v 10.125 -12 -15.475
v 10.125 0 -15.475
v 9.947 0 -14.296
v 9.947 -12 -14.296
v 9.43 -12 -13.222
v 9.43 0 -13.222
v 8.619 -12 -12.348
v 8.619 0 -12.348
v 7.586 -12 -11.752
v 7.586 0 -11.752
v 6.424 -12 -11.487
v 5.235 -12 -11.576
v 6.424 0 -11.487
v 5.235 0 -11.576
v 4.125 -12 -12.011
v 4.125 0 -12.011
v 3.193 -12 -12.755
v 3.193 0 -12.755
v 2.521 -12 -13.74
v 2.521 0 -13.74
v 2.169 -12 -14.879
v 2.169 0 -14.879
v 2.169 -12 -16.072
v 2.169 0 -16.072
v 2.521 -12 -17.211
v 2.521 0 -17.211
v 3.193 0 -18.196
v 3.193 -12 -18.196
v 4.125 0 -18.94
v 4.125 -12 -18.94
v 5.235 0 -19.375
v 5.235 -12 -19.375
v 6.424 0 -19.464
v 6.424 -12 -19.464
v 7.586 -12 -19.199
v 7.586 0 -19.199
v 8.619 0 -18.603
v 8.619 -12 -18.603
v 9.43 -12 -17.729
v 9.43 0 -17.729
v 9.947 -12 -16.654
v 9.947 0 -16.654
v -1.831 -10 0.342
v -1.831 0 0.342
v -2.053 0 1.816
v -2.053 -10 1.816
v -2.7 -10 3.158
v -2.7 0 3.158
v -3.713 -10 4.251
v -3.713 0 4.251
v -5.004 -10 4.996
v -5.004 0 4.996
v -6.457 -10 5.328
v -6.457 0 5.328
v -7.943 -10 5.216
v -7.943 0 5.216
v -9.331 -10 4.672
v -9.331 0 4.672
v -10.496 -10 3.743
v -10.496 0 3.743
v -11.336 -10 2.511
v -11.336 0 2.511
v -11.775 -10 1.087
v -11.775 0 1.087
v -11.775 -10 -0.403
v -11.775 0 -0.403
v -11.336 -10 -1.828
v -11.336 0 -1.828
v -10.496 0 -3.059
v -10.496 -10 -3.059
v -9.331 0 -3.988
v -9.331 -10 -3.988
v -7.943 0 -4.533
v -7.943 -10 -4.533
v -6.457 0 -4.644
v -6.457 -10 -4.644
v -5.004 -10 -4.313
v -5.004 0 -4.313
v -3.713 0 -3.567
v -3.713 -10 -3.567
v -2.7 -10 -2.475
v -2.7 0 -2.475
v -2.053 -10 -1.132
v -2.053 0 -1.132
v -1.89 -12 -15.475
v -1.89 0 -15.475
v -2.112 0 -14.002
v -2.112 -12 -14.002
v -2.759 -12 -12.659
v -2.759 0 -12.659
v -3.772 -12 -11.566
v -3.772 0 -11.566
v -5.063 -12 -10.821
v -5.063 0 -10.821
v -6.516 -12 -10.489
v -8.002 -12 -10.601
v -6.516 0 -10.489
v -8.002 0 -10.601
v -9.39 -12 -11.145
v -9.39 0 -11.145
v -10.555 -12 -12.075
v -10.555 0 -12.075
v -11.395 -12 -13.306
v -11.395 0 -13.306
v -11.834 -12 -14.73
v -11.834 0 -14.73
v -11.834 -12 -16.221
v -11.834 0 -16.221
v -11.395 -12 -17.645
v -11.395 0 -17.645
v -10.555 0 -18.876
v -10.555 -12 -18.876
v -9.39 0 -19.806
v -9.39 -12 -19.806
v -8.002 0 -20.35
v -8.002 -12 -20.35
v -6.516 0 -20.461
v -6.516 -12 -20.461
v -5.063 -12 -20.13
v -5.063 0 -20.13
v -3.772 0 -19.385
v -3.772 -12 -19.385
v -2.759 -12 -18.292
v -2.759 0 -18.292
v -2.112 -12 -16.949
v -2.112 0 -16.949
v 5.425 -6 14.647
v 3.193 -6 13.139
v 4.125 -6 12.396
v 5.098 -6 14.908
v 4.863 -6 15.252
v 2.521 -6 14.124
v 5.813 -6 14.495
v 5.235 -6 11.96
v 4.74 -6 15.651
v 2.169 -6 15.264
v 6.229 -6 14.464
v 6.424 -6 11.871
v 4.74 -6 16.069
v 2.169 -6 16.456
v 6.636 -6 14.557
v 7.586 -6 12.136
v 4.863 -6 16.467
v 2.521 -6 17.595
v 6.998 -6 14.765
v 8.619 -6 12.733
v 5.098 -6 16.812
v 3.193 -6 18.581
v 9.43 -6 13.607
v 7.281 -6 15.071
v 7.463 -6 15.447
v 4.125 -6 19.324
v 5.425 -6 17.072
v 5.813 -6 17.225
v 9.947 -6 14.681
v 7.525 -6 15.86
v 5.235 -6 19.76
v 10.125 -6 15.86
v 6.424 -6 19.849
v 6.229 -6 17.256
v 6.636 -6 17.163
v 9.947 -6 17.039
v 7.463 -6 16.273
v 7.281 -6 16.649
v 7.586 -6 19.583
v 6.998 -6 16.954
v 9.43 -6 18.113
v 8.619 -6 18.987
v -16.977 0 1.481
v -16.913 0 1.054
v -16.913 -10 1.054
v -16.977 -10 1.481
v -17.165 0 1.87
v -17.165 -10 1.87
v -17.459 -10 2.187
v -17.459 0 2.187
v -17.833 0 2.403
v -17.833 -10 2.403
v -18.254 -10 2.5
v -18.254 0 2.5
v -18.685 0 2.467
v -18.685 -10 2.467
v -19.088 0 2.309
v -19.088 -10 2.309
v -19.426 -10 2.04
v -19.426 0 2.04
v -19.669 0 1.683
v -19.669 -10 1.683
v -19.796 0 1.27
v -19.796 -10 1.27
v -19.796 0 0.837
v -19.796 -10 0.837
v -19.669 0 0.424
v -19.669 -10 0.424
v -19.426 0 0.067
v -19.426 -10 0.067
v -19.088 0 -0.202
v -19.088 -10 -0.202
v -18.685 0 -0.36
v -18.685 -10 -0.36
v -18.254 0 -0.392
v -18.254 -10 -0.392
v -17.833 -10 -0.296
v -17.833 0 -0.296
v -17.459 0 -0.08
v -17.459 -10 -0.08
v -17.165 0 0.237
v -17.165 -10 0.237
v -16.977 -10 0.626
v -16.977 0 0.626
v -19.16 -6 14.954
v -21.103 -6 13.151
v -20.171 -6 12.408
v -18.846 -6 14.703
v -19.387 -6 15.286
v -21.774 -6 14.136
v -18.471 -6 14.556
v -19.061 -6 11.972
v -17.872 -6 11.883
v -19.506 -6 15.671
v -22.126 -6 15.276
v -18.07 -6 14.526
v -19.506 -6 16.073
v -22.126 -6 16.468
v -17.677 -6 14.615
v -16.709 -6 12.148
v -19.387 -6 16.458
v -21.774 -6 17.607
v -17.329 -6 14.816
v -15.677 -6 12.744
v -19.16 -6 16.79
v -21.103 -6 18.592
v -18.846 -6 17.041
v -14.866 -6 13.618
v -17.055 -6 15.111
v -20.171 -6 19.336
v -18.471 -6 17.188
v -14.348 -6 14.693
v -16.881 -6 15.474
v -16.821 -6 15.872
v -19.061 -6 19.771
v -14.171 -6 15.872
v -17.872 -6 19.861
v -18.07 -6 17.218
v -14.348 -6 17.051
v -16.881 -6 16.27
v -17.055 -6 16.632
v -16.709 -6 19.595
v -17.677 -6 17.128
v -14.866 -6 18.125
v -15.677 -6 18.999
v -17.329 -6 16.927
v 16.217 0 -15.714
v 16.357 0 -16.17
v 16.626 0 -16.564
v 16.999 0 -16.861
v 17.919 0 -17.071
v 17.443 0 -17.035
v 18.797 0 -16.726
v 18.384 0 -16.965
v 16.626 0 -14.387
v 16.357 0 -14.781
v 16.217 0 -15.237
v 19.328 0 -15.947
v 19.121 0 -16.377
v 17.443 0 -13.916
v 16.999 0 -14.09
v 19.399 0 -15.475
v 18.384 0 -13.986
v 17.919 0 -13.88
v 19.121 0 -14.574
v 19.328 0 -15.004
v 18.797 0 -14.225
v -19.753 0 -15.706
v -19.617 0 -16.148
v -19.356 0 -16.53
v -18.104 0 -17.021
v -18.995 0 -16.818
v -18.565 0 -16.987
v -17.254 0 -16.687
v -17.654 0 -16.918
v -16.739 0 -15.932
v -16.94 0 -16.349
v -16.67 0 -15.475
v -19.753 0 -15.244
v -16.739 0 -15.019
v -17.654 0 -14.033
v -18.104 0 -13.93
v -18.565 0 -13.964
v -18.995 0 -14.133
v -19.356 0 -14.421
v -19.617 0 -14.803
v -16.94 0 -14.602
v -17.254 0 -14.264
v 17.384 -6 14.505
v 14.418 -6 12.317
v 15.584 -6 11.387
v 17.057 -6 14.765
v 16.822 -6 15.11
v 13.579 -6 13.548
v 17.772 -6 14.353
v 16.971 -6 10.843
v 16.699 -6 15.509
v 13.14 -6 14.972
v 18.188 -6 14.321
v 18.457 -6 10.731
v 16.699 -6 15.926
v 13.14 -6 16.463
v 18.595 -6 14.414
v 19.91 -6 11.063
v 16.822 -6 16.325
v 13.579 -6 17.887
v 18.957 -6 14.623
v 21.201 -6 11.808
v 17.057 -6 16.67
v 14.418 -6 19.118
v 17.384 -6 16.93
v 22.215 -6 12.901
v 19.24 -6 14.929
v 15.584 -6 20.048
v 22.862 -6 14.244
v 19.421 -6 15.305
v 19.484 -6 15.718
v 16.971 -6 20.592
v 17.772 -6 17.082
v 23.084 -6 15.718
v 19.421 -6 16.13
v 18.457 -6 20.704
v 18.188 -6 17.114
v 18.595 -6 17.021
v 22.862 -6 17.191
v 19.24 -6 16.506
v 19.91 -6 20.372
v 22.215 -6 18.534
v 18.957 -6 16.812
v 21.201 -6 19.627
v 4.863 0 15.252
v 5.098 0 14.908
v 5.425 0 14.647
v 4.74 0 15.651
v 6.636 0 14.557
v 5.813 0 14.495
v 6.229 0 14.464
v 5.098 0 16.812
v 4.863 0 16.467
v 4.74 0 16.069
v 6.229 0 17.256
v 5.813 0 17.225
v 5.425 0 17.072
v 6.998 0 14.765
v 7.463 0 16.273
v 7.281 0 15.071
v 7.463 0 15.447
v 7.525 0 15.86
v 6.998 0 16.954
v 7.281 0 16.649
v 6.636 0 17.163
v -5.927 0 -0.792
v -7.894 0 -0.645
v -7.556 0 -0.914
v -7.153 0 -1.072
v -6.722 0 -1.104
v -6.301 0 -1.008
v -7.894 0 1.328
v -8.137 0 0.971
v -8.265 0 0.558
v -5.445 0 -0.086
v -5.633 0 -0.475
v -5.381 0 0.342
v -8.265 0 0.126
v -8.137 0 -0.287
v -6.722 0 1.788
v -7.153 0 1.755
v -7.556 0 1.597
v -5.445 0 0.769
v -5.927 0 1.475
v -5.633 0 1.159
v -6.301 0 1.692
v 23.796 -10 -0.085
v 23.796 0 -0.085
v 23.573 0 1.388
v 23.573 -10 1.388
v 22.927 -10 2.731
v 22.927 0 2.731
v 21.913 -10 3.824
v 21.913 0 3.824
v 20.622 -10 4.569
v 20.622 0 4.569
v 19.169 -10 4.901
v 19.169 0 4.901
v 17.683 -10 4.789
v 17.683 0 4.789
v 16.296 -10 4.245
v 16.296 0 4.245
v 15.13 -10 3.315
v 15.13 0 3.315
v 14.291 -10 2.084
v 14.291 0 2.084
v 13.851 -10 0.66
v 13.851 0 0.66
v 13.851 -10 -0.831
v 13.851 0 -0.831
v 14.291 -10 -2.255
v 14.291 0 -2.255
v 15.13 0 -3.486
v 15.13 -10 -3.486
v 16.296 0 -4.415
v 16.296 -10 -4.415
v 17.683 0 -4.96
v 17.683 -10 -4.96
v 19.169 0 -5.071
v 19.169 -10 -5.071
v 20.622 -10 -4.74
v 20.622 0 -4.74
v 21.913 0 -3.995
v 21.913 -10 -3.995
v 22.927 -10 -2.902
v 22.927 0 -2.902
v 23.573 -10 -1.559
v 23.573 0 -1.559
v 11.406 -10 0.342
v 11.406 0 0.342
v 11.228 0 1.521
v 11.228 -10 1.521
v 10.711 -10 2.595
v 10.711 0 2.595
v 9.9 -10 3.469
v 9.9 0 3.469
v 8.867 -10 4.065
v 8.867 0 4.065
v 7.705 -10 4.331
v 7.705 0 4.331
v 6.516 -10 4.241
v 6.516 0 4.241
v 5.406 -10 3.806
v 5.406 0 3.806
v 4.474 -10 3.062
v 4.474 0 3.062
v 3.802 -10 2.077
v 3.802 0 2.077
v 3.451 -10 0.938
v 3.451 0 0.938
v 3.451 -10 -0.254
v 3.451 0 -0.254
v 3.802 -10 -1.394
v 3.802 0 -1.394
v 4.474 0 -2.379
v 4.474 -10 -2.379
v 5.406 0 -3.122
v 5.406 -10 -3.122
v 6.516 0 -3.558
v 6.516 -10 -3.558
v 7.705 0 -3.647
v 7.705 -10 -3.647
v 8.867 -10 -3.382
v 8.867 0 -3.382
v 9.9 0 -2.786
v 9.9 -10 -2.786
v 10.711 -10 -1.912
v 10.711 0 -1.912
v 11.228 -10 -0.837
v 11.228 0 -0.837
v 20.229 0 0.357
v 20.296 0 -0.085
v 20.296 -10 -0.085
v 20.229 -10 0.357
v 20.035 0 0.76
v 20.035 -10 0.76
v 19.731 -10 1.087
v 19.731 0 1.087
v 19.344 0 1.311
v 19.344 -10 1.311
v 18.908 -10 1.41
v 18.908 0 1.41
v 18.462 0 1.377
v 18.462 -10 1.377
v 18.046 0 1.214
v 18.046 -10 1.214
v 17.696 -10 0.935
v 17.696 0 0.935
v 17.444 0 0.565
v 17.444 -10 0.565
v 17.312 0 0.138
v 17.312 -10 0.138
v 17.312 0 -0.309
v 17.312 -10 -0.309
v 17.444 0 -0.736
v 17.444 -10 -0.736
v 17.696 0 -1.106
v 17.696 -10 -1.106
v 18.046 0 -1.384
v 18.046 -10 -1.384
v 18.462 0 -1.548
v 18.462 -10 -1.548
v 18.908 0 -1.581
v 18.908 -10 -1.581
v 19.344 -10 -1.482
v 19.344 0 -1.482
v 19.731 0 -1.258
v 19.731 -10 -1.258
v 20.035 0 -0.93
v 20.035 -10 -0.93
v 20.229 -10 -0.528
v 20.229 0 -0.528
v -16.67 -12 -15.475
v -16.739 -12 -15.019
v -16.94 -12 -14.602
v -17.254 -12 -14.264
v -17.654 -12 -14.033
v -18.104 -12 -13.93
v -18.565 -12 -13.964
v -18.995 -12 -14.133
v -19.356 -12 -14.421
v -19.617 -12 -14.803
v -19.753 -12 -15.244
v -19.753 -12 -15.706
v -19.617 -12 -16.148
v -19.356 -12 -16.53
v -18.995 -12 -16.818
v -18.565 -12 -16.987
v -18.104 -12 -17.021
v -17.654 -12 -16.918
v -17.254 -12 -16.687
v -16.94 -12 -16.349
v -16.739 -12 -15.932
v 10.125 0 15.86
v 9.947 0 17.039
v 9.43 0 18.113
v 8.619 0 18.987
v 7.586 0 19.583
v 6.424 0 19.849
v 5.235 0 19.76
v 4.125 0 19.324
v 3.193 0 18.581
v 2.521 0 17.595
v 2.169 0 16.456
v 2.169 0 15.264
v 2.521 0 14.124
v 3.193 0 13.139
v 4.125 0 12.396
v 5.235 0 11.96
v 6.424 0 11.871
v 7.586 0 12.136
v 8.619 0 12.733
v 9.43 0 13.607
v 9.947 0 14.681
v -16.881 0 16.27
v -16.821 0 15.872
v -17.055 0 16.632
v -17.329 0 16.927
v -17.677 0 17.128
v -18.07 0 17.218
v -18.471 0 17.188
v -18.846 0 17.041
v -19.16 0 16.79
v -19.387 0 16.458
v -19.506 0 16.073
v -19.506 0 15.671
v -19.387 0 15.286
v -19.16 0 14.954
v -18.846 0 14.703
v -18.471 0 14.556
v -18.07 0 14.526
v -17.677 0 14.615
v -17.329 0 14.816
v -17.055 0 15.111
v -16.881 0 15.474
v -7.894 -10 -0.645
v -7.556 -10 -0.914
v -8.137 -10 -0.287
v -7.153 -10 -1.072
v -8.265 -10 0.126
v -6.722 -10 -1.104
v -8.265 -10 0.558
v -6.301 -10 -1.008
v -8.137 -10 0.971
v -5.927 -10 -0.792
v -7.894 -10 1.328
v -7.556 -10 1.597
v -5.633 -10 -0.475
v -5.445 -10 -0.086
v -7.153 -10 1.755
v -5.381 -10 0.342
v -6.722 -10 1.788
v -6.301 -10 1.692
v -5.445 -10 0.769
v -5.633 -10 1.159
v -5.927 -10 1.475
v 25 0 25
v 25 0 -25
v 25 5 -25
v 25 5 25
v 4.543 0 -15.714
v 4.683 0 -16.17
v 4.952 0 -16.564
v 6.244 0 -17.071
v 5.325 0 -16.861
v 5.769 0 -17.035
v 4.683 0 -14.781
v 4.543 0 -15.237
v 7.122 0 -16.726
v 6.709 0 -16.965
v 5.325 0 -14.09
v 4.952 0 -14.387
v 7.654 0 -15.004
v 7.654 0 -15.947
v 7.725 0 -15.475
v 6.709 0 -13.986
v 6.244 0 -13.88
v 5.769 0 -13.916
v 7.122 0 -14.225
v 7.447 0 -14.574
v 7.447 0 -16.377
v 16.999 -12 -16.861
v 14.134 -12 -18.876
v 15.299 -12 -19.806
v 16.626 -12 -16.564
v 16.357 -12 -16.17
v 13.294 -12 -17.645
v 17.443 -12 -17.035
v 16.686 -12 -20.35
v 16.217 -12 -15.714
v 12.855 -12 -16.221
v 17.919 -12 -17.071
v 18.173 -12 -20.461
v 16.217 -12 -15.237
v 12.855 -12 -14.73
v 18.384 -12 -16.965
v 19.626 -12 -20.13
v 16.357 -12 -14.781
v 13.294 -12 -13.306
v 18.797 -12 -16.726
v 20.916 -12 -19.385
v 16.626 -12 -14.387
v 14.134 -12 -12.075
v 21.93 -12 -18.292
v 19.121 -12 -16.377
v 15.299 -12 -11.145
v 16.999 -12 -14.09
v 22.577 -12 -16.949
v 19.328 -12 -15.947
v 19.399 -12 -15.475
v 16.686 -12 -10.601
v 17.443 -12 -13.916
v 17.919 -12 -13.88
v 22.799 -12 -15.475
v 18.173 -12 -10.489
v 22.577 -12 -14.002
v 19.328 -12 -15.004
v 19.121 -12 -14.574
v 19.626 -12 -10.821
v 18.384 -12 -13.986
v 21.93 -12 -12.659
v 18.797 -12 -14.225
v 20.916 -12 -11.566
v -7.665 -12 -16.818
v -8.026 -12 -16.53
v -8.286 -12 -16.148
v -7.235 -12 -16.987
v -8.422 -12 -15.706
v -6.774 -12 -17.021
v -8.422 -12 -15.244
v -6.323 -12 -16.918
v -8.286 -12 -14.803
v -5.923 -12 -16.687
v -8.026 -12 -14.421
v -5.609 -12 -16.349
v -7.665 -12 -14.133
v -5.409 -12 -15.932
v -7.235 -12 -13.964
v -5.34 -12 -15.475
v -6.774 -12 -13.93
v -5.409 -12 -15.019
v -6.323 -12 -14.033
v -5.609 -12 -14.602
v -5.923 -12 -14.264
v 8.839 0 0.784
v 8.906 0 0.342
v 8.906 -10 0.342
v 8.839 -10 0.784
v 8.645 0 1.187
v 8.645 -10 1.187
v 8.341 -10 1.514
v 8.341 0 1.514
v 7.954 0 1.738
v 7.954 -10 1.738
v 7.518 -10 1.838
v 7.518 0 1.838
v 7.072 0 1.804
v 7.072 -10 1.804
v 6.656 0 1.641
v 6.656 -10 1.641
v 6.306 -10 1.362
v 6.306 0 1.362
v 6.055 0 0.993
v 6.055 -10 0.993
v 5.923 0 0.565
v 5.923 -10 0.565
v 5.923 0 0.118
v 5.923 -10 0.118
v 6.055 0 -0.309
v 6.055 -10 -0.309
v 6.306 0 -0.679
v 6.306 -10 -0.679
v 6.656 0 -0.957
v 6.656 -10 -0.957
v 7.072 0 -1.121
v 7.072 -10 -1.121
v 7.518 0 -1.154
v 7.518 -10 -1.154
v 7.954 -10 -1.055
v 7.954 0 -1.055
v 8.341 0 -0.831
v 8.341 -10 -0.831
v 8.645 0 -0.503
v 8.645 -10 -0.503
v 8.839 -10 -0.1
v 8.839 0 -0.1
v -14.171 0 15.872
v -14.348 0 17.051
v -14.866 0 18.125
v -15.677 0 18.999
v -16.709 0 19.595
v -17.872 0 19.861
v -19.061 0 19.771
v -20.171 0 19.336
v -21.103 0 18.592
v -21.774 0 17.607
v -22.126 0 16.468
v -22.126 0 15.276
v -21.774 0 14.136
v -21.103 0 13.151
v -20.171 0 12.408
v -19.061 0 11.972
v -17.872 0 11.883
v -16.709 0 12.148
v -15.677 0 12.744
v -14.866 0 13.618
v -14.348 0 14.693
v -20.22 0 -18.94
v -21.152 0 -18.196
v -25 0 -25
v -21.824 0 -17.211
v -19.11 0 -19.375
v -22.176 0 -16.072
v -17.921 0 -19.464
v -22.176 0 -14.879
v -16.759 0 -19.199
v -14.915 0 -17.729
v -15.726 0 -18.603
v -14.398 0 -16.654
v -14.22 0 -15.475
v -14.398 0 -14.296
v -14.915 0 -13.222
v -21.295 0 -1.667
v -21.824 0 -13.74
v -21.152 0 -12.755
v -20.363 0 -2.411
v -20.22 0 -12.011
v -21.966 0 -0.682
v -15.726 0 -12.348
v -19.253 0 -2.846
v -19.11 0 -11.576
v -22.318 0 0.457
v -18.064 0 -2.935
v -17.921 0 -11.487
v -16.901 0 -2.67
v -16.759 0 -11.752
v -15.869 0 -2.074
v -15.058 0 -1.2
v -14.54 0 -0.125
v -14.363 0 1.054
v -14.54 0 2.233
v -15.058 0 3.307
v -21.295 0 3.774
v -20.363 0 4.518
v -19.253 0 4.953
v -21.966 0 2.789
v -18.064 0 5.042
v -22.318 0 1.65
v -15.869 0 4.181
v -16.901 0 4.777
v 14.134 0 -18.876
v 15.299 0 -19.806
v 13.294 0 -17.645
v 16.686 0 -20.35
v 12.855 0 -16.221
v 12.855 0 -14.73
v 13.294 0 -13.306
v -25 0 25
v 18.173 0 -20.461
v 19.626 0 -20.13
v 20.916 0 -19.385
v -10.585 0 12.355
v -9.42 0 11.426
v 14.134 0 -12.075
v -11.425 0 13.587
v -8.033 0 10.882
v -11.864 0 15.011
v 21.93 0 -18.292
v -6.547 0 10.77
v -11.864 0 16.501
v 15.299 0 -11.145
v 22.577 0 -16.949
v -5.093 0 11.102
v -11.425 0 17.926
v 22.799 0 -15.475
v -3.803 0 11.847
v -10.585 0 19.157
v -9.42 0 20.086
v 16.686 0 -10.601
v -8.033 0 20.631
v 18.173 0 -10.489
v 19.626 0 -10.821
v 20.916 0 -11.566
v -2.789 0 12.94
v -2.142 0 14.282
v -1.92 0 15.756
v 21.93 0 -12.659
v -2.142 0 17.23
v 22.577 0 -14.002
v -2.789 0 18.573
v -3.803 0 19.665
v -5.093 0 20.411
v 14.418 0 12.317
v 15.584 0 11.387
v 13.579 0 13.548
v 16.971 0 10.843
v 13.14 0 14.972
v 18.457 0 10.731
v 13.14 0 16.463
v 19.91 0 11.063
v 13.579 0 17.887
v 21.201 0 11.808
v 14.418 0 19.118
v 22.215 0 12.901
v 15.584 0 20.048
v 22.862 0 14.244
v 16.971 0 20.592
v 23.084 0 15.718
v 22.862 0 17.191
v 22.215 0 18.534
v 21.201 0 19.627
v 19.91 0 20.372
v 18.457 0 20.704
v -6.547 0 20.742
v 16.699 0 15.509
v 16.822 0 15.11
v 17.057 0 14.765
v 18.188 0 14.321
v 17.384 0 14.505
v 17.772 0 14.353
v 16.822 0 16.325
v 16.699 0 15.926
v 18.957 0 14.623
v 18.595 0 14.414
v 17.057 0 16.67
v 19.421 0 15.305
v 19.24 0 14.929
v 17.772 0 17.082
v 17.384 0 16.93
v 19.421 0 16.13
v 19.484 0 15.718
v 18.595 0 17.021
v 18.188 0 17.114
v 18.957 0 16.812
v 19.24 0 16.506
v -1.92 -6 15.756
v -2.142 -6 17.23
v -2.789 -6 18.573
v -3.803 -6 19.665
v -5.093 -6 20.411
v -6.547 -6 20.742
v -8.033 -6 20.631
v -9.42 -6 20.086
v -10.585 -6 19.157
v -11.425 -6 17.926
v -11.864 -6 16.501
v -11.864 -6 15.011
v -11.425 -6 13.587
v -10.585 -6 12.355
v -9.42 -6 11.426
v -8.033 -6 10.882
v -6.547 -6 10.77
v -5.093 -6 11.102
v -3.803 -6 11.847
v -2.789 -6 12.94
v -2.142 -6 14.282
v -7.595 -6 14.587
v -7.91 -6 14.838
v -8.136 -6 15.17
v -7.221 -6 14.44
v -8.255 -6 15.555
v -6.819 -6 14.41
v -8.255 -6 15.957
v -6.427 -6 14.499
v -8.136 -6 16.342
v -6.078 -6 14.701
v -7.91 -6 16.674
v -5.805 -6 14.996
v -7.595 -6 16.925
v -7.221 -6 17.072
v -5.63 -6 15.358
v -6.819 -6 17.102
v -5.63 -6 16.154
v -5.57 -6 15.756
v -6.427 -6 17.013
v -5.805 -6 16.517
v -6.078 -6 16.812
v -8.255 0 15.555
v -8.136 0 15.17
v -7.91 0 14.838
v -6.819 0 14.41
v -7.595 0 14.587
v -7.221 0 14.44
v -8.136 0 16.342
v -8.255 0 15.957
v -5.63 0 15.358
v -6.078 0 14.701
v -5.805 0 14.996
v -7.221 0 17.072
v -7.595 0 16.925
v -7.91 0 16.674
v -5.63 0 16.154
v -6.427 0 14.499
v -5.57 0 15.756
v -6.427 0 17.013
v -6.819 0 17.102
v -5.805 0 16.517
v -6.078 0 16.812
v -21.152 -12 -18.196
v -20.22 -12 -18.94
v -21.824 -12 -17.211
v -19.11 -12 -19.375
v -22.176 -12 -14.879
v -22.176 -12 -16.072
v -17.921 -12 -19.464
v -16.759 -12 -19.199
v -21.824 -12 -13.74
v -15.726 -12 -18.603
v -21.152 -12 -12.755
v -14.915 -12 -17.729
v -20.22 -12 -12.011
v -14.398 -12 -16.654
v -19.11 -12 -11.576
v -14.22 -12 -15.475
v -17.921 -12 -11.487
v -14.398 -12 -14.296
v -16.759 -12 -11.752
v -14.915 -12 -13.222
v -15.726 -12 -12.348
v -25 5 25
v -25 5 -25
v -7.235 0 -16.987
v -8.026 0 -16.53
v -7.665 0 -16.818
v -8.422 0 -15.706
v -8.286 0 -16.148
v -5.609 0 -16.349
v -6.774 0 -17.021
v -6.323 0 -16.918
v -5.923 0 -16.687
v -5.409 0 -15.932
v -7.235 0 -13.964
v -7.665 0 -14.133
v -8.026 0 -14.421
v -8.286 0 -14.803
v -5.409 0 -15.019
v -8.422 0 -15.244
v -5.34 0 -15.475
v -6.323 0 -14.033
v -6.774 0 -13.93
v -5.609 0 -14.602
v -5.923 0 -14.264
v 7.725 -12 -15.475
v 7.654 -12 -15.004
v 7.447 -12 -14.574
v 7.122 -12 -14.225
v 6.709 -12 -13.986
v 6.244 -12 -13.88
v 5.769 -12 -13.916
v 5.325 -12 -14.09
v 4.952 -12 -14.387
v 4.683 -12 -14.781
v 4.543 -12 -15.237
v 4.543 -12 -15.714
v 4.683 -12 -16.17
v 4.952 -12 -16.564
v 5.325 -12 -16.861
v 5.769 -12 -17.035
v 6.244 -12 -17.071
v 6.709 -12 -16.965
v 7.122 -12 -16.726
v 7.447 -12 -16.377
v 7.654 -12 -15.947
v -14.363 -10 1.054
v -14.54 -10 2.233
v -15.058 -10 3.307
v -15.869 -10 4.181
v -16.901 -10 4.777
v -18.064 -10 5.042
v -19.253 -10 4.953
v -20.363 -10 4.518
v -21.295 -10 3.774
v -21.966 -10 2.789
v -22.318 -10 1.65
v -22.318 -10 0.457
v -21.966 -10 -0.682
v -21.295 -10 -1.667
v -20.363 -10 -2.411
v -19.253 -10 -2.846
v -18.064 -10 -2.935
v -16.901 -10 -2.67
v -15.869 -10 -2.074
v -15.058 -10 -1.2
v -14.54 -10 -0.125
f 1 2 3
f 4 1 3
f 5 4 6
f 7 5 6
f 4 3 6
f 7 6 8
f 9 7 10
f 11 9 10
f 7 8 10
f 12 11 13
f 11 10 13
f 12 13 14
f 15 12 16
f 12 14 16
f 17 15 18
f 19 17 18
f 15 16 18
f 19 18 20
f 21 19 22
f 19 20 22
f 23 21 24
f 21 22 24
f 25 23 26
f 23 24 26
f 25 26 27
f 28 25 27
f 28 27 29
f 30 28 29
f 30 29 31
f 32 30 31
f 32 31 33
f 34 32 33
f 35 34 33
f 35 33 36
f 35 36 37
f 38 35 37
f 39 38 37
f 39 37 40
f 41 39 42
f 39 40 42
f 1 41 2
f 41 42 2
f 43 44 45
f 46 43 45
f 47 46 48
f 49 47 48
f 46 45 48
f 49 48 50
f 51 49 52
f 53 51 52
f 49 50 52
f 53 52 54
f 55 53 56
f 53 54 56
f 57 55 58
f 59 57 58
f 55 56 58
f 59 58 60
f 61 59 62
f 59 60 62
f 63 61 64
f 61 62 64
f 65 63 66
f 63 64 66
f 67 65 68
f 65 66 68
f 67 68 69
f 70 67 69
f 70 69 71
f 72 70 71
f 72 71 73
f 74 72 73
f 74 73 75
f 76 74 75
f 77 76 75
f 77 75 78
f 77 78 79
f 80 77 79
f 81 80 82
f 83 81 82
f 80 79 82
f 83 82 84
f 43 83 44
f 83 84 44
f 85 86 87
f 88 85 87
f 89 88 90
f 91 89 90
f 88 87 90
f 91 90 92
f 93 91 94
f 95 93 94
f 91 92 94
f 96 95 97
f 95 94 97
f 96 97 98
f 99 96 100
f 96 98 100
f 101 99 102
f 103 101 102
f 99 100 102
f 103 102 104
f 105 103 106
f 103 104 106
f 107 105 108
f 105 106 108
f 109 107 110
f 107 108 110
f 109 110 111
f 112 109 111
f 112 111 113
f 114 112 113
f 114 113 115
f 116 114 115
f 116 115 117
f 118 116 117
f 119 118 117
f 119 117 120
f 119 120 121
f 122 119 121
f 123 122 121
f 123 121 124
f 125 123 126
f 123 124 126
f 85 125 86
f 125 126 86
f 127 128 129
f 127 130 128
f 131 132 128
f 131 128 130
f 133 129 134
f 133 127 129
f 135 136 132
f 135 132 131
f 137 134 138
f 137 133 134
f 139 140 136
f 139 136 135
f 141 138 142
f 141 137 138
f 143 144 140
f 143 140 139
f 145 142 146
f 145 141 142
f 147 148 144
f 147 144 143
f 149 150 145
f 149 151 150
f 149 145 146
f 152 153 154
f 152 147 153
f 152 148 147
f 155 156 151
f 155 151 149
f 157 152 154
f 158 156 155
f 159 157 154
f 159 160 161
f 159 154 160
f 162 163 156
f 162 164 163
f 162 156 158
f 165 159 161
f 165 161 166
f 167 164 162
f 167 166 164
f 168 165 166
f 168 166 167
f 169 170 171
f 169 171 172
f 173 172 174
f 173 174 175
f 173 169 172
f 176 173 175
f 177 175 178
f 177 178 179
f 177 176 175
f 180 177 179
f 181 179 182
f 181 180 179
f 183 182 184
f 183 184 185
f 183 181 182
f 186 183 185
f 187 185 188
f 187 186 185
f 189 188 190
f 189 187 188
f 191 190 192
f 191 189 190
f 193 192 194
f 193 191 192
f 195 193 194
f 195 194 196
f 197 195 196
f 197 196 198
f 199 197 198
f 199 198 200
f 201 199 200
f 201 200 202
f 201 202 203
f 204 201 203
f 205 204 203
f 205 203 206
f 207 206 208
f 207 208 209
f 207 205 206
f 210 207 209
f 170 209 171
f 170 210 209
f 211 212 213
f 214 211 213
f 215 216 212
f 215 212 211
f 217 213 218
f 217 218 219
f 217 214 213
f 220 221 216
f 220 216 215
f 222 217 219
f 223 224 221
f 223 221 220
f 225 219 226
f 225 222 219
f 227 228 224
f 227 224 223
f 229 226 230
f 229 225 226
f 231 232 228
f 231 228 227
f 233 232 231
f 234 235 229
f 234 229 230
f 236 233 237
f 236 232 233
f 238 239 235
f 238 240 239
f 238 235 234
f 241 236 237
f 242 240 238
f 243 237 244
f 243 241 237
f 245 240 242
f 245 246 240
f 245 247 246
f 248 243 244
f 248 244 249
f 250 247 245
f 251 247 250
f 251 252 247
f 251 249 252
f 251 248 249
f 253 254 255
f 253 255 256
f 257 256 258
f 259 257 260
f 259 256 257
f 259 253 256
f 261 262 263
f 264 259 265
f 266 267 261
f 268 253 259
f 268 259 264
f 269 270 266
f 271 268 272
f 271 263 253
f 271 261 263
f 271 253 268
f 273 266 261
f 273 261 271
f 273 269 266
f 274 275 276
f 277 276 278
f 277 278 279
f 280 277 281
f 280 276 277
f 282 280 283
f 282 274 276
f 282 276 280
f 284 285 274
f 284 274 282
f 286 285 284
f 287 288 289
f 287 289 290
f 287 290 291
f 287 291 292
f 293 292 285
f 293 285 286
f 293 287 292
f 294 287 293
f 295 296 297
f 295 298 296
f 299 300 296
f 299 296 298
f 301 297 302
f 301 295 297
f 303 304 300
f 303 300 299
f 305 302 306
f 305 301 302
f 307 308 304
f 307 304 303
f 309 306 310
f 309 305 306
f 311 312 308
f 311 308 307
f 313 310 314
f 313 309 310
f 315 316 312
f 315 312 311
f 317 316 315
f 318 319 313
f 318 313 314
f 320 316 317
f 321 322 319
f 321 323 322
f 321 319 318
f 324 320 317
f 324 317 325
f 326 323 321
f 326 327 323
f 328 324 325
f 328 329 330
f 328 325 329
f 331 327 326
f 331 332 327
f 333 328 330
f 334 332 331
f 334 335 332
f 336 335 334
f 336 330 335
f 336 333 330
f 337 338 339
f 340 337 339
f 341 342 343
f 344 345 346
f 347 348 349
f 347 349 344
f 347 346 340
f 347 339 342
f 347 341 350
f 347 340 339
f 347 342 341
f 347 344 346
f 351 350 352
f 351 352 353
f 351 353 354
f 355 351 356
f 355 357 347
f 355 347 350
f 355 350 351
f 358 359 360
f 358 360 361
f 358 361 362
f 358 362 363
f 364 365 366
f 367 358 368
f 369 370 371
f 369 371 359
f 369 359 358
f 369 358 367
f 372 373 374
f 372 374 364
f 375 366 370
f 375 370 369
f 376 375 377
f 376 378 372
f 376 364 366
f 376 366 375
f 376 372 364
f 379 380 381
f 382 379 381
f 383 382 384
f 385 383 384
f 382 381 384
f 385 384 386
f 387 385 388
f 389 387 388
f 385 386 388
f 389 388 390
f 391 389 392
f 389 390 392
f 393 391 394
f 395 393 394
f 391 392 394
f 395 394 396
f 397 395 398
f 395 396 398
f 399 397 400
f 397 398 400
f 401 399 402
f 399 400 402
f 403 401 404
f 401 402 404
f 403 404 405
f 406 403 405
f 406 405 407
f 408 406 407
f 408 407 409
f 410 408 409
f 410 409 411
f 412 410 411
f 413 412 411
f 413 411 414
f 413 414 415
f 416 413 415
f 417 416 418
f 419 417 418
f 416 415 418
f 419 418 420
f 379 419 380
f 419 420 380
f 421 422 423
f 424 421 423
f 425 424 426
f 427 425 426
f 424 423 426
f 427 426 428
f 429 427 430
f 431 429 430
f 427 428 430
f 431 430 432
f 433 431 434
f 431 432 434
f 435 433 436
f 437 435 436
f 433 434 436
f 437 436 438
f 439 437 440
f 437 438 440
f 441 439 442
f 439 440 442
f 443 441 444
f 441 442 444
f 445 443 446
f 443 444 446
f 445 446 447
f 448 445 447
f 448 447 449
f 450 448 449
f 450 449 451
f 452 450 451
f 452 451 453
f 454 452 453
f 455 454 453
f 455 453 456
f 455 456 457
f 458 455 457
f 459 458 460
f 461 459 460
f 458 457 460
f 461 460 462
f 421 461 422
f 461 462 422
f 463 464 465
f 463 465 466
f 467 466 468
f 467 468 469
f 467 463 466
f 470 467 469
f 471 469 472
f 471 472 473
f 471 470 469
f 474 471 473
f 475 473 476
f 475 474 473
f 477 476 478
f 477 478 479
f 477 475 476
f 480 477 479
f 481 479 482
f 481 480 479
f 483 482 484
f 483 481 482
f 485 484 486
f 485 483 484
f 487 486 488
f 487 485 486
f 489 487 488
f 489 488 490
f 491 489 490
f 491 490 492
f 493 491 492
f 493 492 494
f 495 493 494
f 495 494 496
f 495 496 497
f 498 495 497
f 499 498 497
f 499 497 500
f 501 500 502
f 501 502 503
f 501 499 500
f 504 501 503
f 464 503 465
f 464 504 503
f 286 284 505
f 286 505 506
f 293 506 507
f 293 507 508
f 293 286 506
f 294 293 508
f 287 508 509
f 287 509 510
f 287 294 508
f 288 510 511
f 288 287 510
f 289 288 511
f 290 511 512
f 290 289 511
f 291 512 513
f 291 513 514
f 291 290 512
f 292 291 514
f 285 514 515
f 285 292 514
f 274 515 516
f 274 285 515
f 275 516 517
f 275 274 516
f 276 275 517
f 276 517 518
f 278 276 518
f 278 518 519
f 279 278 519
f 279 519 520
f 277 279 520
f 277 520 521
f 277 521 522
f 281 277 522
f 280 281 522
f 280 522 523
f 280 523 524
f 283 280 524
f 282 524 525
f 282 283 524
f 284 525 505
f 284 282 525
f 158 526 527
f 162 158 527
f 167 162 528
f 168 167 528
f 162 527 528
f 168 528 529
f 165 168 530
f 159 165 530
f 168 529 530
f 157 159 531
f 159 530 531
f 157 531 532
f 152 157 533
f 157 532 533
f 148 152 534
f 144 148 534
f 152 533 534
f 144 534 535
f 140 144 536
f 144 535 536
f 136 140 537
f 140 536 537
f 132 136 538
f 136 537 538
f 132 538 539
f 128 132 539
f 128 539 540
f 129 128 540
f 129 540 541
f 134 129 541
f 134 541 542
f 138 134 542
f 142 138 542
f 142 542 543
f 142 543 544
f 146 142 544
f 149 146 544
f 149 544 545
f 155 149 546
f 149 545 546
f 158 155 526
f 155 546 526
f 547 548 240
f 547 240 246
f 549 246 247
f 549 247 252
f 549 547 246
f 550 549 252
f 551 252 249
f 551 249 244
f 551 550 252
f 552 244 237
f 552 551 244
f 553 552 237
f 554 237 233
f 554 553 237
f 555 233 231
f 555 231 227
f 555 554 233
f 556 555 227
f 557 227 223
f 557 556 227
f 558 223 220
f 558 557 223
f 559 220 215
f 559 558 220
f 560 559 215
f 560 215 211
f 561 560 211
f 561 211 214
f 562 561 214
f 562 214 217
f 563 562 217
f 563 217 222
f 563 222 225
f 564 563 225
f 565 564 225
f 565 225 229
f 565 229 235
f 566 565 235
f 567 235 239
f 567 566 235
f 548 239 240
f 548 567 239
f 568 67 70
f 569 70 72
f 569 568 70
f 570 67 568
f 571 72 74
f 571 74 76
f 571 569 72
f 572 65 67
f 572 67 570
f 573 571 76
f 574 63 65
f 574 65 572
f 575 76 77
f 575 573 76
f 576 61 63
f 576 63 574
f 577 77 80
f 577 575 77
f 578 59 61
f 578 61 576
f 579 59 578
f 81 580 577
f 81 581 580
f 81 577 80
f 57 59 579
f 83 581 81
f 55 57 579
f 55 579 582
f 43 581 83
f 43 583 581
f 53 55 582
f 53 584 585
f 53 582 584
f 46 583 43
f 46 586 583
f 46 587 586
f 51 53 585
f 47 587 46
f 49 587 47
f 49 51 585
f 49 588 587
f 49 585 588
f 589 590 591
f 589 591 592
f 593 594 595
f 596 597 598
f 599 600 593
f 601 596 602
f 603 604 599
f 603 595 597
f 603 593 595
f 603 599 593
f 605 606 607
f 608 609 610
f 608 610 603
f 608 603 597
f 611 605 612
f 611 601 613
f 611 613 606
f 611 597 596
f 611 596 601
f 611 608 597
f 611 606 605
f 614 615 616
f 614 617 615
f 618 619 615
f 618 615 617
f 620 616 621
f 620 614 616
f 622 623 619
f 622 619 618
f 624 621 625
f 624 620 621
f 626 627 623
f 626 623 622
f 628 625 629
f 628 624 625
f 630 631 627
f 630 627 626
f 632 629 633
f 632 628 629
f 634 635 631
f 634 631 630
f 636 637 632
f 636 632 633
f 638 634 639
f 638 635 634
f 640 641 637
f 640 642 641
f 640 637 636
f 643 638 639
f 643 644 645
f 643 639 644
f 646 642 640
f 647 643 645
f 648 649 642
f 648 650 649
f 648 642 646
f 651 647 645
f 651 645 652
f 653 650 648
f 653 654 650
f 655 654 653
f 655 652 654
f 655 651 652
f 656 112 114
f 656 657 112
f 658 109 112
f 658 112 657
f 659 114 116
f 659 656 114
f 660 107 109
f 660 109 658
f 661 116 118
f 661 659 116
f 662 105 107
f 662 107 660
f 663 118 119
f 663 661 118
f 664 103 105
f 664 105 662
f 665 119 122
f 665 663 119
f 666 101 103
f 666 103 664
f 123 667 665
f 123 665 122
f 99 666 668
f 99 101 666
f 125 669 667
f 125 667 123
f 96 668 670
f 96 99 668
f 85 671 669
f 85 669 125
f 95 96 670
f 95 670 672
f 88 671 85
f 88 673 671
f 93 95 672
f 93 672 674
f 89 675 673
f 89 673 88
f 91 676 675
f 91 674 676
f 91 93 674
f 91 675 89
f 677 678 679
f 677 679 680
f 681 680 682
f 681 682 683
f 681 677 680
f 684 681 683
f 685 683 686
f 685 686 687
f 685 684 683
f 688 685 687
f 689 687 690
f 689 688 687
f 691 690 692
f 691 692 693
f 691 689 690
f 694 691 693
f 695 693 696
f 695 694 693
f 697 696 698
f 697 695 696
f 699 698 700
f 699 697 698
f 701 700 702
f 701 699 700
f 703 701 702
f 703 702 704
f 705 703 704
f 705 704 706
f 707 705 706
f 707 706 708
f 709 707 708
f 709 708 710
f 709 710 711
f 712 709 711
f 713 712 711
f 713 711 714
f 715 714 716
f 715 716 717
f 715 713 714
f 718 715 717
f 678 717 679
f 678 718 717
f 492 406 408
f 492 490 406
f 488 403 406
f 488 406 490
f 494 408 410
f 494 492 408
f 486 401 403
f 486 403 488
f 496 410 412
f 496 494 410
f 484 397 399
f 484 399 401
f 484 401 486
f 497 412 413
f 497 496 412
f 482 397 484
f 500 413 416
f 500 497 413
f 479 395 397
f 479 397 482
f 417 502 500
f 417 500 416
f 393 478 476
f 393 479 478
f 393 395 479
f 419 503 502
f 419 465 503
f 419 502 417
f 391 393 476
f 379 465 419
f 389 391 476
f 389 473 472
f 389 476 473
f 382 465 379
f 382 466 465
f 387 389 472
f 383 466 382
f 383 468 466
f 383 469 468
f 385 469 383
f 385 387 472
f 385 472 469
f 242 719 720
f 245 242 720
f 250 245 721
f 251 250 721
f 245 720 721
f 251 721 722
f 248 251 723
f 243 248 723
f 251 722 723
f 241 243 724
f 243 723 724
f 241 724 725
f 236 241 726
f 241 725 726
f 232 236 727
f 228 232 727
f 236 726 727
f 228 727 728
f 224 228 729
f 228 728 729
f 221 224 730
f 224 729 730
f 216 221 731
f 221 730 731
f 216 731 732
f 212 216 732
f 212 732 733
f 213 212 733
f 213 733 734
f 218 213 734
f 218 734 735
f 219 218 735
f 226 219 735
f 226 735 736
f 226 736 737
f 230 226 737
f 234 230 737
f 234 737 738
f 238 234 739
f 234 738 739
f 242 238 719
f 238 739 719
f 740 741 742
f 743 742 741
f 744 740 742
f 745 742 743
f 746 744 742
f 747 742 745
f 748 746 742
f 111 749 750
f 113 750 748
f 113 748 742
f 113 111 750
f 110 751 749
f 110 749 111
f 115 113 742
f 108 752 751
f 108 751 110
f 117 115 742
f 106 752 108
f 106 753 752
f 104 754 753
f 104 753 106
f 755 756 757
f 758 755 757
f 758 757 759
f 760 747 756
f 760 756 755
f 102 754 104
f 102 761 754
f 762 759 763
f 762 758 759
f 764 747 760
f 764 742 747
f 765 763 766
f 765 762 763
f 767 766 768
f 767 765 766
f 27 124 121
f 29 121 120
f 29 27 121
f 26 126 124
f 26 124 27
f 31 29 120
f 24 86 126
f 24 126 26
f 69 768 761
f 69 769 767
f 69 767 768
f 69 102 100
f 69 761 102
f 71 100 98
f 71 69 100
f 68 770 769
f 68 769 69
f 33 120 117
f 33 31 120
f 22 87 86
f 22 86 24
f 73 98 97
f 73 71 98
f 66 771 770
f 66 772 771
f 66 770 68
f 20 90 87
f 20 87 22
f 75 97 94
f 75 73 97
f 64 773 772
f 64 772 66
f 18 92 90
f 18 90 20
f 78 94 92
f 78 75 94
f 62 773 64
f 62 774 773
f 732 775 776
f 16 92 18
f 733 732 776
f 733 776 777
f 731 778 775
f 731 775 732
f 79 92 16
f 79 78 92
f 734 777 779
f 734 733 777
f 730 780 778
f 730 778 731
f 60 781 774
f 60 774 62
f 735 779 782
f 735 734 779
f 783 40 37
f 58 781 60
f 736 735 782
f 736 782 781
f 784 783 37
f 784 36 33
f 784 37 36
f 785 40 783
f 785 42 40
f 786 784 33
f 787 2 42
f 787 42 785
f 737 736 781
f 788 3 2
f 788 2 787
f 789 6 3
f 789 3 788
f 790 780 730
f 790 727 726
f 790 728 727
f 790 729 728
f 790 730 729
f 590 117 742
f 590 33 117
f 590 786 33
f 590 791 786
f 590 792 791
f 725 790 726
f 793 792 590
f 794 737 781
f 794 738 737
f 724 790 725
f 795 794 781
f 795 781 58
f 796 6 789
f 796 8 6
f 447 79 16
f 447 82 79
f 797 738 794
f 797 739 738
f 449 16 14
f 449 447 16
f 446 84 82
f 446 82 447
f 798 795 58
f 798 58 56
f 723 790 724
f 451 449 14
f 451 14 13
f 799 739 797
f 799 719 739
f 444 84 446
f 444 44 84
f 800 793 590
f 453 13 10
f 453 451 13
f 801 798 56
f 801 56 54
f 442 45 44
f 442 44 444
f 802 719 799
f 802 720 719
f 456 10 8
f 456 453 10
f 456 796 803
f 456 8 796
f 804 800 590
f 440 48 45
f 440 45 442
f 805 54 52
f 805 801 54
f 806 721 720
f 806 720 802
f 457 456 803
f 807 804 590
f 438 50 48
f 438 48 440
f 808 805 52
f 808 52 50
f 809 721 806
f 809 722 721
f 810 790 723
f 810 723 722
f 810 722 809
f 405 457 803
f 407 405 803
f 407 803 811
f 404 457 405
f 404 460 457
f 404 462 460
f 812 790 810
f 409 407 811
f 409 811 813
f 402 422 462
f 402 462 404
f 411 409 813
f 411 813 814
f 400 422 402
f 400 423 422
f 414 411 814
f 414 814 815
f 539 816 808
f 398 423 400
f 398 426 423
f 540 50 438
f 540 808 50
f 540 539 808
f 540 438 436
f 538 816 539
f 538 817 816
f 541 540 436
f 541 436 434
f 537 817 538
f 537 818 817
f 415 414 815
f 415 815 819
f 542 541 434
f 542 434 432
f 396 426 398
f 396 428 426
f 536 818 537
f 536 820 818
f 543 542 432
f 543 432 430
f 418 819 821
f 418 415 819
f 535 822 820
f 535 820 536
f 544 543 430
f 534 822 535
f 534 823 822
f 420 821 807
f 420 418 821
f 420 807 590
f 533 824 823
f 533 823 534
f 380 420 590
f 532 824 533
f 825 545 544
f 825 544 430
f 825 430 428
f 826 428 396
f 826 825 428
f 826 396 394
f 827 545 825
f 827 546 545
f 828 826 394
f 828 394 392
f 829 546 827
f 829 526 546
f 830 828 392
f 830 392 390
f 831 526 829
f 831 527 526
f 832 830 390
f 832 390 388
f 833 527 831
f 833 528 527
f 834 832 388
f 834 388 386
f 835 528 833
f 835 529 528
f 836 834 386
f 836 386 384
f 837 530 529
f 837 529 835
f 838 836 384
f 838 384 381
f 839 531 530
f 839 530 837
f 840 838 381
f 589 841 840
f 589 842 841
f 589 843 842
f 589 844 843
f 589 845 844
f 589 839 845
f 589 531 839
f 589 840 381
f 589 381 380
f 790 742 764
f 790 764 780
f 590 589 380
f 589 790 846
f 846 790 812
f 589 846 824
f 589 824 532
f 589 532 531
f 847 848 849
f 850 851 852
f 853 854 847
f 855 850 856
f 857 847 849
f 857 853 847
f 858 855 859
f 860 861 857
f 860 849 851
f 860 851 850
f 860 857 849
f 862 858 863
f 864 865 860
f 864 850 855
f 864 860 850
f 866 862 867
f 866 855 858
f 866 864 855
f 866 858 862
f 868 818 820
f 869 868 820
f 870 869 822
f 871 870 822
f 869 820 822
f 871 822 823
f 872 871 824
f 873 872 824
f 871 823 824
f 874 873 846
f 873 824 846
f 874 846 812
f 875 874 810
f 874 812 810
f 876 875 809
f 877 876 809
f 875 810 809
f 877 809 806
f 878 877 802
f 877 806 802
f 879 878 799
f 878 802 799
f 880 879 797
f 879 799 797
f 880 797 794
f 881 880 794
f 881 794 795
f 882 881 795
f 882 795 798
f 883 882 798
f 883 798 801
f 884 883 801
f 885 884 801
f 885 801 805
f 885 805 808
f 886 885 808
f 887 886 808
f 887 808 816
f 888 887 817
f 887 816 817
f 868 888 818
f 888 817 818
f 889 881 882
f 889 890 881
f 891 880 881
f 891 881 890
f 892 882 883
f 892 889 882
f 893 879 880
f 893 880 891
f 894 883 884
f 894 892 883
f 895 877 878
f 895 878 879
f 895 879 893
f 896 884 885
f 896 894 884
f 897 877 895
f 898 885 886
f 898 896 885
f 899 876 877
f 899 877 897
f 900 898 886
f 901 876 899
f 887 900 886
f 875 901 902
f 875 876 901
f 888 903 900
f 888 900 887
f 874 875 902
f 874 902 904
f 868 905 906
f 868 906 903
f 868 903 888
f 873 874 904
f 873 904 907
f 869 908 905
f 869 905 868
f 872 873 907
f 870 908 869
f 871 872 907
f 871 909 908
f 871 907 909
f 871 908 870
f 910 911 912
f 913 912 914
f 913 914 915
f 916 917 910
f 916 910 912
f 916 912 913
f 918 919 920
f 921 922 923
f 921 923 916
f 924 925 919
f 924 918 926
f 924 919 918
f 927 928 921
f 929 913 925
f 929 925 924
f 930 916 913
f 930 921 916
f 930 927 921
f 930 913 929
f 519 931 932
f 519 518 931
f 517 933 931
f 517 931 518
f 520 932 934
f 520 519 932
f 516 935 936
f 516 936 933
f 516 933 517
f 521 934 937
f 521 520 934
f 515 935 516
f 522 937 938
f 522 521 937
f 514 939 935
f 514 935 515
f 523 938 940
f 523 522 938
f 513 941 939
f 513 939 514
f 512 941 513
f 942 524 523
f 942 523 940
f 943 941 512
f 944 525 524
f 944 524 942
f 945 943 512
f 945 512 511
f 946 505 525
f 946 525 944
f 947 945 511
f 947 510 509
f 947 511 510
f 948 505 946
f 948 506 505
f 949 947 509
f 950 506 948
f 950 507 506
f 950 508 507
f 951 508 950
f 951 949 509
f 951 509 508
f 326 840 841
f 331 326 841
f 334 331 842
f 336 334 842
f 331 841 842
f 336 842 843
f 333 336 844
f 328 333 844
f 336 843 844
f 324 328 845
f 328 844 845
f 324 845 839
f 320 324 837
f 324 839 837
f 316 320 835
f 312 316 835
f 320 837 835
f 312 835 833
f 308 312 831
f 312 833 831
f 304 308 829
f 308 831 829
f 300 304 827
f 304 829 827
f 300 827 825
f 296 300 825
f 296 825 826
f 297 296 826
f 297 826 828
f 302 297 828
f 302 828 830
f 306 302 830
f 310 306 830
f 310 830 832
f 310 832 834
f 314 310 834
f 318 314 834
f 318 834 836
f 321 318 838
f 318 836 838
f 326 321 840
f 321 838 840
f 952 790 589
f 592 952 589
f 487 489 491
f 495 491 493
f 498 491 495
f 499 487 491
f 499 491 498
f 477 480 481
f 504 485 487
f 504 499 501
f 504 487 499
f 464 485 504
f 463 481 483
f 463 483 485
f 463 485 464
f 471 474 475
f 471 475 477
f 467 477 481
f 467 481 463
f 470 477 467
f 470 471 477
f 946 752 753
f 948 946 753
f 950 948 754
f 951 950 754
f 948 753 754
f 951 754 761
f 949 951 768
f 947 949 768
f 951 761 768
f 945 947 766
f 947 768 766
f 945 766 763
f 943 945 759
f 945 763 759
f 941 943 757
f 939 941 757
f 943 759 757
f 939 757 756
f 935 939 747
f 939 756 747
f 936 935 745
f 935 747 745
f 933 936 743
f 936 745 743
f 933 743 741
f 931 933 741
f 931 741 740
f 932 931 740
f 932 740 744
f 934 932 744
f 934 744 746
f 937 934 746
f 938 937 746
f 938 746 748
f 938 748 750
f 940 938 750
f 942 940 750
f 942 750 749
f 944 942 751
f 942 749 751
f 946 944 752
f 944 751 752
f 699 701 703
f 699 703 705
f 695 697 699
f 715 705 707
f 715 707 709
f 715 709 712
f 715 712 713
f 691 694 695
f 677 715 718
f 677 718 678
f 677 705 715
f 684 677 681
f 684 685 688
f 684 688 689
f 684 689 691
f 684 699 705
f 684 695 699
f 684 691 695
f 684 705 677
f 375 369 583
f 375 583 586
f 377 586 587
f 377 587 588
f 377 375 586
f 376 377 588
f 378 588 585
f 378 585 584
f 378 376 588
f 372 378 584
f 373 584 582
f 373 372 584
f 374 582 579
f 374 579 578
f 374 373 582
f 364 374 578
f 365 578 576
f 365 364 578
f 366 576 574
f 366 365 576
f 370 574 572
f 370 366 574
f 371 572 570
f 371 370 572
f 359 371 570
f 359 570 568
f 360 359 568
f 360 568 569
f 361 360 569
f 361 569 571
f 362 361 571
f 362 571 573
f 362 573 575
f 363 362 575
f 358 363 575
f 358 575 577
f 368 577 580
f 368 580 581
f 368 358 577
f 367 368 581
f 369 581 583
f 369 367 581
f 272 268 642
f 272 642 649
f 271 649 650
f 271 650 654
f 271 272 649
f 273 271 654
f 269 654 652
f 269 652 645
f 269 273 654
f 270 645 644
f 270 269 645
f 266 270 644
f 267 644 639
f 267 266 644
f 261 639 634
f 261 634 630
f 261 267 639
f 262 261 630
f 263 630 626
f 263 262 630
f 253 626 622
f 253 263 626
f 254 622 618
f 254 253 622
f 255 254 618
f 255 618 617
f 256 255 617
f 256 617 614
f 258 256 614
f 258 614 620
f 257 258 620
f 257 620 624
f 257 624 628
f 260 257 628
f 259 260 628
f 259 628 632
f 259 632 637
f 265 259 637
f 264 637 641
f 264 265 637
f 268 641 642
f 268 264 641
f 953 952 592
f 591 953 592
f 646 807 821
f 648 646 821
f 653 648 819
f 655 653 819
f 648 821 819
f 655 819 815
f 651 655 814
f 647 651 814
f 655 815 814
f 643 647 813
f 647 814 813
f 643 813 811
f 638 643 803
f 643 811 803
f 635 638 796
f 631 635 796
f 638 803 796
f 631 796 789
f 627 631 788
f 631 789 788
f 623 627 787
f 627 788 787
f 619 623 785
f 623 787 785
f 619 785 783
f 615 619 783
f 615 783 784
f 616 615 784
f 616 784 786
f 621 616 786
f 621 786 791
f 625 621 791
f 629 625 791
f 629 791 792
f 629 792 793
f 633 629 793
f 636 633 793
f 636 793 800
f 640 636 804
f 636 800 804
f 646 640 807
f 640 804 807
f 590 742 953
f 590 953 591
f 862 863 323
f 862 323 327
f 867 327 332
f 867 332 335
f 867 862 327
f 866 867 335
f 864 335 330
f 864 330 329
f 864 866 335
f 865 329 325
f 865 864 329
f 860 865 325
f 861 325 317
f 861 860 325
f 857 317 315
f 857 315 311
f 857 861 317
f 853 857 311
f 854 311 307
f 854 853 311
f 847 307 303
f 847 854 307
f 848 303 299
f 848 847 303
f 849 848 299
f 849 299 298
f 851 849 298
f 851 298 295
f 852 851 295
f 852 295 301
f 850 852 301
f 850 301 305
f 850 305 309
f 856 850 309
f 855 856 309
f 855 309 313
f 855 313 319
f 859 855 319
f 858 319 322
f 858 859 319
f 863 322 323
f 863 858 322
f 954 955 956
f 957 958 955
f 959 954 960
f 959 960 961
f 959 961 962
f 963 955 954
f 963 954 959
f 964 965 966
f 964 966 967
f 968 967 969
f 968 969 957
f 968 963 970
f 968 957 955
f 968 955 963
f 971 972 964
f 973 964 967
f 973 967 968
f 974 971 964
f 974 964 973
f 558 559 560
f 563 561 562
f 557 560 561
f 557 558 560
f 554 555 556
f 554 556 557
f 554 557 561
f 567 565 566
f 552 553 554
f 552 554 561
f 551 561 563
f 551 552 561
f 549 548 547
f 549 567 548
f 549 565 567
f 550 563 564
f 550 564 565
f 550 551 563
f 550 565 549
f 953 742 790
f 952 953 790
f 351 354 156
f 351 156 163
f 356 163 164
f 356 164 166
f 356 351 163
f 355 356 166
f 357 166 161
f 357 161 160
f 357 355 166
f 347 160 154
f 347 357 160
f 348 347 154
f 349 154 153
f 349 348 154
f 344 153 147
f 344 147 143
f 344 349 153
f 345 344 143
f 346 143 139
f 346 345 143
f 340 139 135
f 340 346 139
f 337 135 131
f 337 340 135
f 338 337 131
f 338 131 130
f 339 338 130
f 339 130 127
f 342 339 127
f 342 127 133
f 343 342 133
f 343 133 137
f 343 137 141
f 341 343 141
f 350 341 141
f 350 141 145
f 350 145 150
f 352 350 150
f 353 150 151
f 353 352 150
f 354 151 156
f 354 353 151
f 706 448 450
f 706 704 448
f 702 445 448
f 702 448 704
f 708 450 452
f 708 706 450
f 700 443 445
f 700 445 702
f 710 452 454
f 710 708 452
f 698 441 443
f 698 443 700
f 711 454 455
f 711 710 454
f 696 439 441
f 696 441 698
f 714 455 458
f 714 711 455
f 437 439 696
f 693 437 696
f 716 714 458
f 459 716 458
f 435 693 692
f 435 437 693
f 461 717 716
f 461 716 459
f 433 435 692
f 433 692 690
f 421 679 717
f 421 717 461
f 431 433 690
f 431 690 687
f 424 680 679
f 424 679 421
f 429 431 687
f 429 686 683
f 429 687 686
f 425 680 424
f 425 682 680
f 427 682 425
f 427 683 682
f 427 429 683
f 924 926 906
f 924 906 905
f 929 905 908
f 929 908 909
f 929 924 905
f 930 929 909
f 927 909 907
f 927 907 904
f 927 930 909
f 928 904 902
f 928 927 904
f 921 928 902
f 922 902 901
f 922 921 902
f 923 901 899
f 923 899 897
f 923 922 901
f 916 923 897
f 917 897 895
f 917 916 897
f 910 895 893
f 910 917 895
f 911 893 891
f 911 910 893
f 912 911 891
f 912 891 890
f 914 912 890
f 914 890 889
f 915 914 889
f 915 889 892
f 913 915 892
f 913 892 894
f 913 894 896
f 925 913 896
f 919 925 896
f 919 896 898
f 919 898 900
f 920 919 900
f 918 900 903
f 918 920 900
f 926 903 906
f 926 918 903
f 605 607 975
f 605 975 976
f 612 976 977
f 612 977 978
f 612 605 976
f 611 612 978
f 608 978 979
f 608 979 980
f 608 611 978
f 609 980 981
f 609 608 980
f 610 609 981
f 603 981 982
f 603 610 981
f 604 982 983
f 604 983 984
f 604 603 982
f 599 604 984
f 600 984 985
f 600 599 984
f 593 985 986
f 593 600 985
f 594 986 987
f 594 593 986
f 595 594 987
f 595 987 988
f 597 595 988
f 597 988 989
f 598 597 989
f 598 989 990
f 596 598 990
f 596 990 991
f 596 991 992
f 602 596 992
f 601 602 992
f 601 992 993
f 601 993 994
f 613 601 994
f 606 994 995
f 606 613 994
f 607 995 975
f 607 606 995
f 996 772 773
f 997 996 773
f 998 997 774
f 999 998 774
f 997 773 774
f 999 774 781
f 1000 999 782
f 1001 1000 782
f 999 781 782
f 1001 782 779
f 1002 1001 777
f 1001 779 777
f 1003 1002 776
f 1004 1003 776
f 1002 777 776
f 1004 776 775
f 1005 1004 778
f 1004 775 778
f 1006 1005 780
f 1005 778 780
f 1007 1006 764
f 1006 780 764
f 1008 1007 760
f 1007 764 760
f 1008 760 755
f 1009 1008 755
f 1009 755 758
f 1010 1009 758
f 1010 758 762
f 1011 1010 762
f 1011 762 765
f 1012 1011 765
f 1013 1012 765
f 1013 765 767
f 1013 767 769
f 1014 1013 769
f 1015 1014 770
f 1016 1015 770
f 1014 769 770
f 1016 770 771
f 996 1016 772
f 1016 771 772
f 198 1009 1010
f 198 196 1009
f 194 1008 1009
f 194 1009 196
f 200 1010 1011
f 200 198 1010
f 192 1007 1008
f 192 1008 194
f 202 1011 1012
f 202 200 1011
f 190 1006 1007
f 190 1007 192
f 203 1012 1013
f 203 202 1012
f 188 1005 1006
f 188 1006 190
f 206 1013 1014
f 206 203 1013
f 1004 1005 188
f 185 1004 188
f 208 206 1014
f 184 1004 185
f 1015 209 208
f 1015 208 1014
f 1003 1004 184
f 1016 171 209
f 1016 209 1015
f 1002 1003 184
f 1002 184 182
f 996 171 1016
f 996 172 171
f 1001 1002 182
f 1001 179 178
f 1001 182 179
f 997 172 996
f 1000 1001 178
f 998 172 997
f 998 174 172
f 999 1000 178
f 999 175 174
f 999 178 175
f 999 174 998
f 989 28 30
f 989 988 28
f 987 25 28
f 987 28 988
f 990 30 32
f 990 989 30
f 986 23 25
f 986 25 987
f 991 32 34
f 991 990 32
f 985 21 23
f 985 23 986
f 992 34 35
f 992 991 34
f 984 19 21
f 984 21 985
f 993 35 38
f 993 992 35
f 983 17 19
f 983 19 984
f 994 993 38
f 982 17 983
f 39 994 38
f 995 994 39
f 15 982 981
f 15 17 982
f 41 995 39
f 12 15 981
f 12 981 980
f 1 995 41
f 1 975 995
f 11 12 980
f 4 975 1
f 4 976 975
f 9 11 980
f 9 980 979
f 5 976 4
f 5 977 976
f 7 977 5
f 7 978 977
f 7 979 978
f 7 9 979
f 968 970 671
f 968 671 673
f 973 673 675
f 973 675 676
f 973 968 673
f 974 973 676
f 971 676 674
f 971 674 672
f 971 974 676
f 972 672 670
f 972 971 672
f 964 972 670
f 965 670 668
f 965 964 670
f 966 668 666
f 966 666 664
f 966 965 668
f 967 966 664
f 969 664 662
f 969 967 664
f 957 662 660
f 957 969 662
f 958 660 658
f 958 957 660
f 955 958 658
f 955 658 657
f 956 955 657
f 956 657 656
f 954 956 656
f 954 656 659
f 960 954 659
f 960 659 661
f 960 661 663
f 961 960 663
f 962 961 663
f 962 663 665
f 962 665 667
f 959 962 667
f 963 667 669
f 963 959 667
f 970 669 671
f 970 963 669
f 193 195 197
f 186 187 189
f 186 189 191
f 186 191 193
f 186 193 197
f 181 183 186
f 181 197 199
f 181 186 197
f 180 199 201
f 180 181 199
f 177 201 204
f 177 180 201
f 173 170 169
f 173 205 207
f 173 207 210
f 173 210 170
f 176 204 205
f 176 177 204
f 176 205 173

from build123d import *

# Parameters (mm, degrees)
F0_W     = 50
F0_H     = 50
F2_DEPTH = 5
F1_R     = 4
F1_R_2   = 1.35
F1_R_3   = 5
F1_R_4   = 1.4
F3_DEPTH = 6
F1_R_5   = 1.45
F1_R_6   = 1.5
F4_DEPTH = 10
F1_R_7   = 1.55
F1_R_8   = 1.6
F5_DEPTH = 12


with BuildPart() as f2:
    # F0 (on Front) → F2 (new body)
    with BuildSketch(Plane.XZ):
        Rectangle(F0_W, F0_H)
    extrude(amount=-F2_DEPTH)

    # F1 (on Front) → F3 (join)
    with BuildSketch(Plane.XZ):
        with Locations((-18.170596, 15.871764)):
            Circle(F1_R)
        with Locations((-18.170596, 15.871764)):
            Circle(F1_R_2, mode=Mode.SUBTRACT)
        with Locations((-6.920179, 15.756146)):
            Circle(F1_R_3)
        with Locations((-6.920179, 15.756146)):
            Circle(F1_R_2, mode=Mode.SUBTRACT)
        with Locations((6.124761, 15.85988)):
            Circle(F1_R)
        with Locations((6.124761, 15.85988)):
            Circle(F1_R_4, mode=Mode.SUBTRACT)
        with Locations((18.083698, 15.717511)):
            Circle(F1_R_3)
        with Locations((18.083698, 15.717511)):
            Circle(F1_R_4, mode=Mode.SUBTRACT)
    extrude(amount=F3_DEPTH)

    # F1 (on Front) → F4 (join)
    with BuildSketch(Plane.XZ):
        with Locations((-18.362585, 1.053578)):
            Circle(F1_R)
        with Locations((-18.362585, 1.053578)):
            Circle(F1_R_5, mode=Mode.SUBTRACT)
        with Locations((-6.830752, 0.341737)):
            Circle(F1_R_3)
        with Locations((-6.830752, 0.341737)):
            Circle(F1_R_5, mode=Mode.SUBTRACT)
        with Locations((7.406075, 0.341737)):
            Circle(F1_R)
        with Locations((7.406075, 0.341737)):
            Circle(F1_R_6, mode=Mode.SUBTRACT)
        with Locations((18.795539, -0.085368)):
            Circle(F1_R_3)
        with Locations((18.795539, -0.085368)):
            Circle(F1_R_6, mode=Mode.SUBTRACT)
    extrude(amount=F4_DEPTH)

    # F1 (on Front) → F5 (join)
    with BuildSketch(Plane.XZ):
        with Locations((-6.889718, -15.475452)):
            Circle(F1_R_3)
        with Locations((-6.889718, -15.475452)):
            Circle(F1_R_7, mode=Mode.SUBTRACT)
        with Locations((-18.220215, -15.475452)):
            Circle(F1_R)
        with Locations((-18.220215, -15.475452)):
            Circle(F1_R_7, mode=Mode.SUBTRACT)
        with Locations((6.124761, -15.475452)):
            Circle(F1_R)
        with Locations((6.124761, -15.475452)):
            Circle(F1_R_8, mode=Mode.SUBTRACT)
        with Locations((17.798963, -15.475452)):
            Circle(F1_R_3)
        with Locations((17.798963, -15.475452)):
            Circle(F1_R_8, mode=Mode.SUBTRACT)
    extrude(amount=F5_DEPTH)


solid = f2.part
